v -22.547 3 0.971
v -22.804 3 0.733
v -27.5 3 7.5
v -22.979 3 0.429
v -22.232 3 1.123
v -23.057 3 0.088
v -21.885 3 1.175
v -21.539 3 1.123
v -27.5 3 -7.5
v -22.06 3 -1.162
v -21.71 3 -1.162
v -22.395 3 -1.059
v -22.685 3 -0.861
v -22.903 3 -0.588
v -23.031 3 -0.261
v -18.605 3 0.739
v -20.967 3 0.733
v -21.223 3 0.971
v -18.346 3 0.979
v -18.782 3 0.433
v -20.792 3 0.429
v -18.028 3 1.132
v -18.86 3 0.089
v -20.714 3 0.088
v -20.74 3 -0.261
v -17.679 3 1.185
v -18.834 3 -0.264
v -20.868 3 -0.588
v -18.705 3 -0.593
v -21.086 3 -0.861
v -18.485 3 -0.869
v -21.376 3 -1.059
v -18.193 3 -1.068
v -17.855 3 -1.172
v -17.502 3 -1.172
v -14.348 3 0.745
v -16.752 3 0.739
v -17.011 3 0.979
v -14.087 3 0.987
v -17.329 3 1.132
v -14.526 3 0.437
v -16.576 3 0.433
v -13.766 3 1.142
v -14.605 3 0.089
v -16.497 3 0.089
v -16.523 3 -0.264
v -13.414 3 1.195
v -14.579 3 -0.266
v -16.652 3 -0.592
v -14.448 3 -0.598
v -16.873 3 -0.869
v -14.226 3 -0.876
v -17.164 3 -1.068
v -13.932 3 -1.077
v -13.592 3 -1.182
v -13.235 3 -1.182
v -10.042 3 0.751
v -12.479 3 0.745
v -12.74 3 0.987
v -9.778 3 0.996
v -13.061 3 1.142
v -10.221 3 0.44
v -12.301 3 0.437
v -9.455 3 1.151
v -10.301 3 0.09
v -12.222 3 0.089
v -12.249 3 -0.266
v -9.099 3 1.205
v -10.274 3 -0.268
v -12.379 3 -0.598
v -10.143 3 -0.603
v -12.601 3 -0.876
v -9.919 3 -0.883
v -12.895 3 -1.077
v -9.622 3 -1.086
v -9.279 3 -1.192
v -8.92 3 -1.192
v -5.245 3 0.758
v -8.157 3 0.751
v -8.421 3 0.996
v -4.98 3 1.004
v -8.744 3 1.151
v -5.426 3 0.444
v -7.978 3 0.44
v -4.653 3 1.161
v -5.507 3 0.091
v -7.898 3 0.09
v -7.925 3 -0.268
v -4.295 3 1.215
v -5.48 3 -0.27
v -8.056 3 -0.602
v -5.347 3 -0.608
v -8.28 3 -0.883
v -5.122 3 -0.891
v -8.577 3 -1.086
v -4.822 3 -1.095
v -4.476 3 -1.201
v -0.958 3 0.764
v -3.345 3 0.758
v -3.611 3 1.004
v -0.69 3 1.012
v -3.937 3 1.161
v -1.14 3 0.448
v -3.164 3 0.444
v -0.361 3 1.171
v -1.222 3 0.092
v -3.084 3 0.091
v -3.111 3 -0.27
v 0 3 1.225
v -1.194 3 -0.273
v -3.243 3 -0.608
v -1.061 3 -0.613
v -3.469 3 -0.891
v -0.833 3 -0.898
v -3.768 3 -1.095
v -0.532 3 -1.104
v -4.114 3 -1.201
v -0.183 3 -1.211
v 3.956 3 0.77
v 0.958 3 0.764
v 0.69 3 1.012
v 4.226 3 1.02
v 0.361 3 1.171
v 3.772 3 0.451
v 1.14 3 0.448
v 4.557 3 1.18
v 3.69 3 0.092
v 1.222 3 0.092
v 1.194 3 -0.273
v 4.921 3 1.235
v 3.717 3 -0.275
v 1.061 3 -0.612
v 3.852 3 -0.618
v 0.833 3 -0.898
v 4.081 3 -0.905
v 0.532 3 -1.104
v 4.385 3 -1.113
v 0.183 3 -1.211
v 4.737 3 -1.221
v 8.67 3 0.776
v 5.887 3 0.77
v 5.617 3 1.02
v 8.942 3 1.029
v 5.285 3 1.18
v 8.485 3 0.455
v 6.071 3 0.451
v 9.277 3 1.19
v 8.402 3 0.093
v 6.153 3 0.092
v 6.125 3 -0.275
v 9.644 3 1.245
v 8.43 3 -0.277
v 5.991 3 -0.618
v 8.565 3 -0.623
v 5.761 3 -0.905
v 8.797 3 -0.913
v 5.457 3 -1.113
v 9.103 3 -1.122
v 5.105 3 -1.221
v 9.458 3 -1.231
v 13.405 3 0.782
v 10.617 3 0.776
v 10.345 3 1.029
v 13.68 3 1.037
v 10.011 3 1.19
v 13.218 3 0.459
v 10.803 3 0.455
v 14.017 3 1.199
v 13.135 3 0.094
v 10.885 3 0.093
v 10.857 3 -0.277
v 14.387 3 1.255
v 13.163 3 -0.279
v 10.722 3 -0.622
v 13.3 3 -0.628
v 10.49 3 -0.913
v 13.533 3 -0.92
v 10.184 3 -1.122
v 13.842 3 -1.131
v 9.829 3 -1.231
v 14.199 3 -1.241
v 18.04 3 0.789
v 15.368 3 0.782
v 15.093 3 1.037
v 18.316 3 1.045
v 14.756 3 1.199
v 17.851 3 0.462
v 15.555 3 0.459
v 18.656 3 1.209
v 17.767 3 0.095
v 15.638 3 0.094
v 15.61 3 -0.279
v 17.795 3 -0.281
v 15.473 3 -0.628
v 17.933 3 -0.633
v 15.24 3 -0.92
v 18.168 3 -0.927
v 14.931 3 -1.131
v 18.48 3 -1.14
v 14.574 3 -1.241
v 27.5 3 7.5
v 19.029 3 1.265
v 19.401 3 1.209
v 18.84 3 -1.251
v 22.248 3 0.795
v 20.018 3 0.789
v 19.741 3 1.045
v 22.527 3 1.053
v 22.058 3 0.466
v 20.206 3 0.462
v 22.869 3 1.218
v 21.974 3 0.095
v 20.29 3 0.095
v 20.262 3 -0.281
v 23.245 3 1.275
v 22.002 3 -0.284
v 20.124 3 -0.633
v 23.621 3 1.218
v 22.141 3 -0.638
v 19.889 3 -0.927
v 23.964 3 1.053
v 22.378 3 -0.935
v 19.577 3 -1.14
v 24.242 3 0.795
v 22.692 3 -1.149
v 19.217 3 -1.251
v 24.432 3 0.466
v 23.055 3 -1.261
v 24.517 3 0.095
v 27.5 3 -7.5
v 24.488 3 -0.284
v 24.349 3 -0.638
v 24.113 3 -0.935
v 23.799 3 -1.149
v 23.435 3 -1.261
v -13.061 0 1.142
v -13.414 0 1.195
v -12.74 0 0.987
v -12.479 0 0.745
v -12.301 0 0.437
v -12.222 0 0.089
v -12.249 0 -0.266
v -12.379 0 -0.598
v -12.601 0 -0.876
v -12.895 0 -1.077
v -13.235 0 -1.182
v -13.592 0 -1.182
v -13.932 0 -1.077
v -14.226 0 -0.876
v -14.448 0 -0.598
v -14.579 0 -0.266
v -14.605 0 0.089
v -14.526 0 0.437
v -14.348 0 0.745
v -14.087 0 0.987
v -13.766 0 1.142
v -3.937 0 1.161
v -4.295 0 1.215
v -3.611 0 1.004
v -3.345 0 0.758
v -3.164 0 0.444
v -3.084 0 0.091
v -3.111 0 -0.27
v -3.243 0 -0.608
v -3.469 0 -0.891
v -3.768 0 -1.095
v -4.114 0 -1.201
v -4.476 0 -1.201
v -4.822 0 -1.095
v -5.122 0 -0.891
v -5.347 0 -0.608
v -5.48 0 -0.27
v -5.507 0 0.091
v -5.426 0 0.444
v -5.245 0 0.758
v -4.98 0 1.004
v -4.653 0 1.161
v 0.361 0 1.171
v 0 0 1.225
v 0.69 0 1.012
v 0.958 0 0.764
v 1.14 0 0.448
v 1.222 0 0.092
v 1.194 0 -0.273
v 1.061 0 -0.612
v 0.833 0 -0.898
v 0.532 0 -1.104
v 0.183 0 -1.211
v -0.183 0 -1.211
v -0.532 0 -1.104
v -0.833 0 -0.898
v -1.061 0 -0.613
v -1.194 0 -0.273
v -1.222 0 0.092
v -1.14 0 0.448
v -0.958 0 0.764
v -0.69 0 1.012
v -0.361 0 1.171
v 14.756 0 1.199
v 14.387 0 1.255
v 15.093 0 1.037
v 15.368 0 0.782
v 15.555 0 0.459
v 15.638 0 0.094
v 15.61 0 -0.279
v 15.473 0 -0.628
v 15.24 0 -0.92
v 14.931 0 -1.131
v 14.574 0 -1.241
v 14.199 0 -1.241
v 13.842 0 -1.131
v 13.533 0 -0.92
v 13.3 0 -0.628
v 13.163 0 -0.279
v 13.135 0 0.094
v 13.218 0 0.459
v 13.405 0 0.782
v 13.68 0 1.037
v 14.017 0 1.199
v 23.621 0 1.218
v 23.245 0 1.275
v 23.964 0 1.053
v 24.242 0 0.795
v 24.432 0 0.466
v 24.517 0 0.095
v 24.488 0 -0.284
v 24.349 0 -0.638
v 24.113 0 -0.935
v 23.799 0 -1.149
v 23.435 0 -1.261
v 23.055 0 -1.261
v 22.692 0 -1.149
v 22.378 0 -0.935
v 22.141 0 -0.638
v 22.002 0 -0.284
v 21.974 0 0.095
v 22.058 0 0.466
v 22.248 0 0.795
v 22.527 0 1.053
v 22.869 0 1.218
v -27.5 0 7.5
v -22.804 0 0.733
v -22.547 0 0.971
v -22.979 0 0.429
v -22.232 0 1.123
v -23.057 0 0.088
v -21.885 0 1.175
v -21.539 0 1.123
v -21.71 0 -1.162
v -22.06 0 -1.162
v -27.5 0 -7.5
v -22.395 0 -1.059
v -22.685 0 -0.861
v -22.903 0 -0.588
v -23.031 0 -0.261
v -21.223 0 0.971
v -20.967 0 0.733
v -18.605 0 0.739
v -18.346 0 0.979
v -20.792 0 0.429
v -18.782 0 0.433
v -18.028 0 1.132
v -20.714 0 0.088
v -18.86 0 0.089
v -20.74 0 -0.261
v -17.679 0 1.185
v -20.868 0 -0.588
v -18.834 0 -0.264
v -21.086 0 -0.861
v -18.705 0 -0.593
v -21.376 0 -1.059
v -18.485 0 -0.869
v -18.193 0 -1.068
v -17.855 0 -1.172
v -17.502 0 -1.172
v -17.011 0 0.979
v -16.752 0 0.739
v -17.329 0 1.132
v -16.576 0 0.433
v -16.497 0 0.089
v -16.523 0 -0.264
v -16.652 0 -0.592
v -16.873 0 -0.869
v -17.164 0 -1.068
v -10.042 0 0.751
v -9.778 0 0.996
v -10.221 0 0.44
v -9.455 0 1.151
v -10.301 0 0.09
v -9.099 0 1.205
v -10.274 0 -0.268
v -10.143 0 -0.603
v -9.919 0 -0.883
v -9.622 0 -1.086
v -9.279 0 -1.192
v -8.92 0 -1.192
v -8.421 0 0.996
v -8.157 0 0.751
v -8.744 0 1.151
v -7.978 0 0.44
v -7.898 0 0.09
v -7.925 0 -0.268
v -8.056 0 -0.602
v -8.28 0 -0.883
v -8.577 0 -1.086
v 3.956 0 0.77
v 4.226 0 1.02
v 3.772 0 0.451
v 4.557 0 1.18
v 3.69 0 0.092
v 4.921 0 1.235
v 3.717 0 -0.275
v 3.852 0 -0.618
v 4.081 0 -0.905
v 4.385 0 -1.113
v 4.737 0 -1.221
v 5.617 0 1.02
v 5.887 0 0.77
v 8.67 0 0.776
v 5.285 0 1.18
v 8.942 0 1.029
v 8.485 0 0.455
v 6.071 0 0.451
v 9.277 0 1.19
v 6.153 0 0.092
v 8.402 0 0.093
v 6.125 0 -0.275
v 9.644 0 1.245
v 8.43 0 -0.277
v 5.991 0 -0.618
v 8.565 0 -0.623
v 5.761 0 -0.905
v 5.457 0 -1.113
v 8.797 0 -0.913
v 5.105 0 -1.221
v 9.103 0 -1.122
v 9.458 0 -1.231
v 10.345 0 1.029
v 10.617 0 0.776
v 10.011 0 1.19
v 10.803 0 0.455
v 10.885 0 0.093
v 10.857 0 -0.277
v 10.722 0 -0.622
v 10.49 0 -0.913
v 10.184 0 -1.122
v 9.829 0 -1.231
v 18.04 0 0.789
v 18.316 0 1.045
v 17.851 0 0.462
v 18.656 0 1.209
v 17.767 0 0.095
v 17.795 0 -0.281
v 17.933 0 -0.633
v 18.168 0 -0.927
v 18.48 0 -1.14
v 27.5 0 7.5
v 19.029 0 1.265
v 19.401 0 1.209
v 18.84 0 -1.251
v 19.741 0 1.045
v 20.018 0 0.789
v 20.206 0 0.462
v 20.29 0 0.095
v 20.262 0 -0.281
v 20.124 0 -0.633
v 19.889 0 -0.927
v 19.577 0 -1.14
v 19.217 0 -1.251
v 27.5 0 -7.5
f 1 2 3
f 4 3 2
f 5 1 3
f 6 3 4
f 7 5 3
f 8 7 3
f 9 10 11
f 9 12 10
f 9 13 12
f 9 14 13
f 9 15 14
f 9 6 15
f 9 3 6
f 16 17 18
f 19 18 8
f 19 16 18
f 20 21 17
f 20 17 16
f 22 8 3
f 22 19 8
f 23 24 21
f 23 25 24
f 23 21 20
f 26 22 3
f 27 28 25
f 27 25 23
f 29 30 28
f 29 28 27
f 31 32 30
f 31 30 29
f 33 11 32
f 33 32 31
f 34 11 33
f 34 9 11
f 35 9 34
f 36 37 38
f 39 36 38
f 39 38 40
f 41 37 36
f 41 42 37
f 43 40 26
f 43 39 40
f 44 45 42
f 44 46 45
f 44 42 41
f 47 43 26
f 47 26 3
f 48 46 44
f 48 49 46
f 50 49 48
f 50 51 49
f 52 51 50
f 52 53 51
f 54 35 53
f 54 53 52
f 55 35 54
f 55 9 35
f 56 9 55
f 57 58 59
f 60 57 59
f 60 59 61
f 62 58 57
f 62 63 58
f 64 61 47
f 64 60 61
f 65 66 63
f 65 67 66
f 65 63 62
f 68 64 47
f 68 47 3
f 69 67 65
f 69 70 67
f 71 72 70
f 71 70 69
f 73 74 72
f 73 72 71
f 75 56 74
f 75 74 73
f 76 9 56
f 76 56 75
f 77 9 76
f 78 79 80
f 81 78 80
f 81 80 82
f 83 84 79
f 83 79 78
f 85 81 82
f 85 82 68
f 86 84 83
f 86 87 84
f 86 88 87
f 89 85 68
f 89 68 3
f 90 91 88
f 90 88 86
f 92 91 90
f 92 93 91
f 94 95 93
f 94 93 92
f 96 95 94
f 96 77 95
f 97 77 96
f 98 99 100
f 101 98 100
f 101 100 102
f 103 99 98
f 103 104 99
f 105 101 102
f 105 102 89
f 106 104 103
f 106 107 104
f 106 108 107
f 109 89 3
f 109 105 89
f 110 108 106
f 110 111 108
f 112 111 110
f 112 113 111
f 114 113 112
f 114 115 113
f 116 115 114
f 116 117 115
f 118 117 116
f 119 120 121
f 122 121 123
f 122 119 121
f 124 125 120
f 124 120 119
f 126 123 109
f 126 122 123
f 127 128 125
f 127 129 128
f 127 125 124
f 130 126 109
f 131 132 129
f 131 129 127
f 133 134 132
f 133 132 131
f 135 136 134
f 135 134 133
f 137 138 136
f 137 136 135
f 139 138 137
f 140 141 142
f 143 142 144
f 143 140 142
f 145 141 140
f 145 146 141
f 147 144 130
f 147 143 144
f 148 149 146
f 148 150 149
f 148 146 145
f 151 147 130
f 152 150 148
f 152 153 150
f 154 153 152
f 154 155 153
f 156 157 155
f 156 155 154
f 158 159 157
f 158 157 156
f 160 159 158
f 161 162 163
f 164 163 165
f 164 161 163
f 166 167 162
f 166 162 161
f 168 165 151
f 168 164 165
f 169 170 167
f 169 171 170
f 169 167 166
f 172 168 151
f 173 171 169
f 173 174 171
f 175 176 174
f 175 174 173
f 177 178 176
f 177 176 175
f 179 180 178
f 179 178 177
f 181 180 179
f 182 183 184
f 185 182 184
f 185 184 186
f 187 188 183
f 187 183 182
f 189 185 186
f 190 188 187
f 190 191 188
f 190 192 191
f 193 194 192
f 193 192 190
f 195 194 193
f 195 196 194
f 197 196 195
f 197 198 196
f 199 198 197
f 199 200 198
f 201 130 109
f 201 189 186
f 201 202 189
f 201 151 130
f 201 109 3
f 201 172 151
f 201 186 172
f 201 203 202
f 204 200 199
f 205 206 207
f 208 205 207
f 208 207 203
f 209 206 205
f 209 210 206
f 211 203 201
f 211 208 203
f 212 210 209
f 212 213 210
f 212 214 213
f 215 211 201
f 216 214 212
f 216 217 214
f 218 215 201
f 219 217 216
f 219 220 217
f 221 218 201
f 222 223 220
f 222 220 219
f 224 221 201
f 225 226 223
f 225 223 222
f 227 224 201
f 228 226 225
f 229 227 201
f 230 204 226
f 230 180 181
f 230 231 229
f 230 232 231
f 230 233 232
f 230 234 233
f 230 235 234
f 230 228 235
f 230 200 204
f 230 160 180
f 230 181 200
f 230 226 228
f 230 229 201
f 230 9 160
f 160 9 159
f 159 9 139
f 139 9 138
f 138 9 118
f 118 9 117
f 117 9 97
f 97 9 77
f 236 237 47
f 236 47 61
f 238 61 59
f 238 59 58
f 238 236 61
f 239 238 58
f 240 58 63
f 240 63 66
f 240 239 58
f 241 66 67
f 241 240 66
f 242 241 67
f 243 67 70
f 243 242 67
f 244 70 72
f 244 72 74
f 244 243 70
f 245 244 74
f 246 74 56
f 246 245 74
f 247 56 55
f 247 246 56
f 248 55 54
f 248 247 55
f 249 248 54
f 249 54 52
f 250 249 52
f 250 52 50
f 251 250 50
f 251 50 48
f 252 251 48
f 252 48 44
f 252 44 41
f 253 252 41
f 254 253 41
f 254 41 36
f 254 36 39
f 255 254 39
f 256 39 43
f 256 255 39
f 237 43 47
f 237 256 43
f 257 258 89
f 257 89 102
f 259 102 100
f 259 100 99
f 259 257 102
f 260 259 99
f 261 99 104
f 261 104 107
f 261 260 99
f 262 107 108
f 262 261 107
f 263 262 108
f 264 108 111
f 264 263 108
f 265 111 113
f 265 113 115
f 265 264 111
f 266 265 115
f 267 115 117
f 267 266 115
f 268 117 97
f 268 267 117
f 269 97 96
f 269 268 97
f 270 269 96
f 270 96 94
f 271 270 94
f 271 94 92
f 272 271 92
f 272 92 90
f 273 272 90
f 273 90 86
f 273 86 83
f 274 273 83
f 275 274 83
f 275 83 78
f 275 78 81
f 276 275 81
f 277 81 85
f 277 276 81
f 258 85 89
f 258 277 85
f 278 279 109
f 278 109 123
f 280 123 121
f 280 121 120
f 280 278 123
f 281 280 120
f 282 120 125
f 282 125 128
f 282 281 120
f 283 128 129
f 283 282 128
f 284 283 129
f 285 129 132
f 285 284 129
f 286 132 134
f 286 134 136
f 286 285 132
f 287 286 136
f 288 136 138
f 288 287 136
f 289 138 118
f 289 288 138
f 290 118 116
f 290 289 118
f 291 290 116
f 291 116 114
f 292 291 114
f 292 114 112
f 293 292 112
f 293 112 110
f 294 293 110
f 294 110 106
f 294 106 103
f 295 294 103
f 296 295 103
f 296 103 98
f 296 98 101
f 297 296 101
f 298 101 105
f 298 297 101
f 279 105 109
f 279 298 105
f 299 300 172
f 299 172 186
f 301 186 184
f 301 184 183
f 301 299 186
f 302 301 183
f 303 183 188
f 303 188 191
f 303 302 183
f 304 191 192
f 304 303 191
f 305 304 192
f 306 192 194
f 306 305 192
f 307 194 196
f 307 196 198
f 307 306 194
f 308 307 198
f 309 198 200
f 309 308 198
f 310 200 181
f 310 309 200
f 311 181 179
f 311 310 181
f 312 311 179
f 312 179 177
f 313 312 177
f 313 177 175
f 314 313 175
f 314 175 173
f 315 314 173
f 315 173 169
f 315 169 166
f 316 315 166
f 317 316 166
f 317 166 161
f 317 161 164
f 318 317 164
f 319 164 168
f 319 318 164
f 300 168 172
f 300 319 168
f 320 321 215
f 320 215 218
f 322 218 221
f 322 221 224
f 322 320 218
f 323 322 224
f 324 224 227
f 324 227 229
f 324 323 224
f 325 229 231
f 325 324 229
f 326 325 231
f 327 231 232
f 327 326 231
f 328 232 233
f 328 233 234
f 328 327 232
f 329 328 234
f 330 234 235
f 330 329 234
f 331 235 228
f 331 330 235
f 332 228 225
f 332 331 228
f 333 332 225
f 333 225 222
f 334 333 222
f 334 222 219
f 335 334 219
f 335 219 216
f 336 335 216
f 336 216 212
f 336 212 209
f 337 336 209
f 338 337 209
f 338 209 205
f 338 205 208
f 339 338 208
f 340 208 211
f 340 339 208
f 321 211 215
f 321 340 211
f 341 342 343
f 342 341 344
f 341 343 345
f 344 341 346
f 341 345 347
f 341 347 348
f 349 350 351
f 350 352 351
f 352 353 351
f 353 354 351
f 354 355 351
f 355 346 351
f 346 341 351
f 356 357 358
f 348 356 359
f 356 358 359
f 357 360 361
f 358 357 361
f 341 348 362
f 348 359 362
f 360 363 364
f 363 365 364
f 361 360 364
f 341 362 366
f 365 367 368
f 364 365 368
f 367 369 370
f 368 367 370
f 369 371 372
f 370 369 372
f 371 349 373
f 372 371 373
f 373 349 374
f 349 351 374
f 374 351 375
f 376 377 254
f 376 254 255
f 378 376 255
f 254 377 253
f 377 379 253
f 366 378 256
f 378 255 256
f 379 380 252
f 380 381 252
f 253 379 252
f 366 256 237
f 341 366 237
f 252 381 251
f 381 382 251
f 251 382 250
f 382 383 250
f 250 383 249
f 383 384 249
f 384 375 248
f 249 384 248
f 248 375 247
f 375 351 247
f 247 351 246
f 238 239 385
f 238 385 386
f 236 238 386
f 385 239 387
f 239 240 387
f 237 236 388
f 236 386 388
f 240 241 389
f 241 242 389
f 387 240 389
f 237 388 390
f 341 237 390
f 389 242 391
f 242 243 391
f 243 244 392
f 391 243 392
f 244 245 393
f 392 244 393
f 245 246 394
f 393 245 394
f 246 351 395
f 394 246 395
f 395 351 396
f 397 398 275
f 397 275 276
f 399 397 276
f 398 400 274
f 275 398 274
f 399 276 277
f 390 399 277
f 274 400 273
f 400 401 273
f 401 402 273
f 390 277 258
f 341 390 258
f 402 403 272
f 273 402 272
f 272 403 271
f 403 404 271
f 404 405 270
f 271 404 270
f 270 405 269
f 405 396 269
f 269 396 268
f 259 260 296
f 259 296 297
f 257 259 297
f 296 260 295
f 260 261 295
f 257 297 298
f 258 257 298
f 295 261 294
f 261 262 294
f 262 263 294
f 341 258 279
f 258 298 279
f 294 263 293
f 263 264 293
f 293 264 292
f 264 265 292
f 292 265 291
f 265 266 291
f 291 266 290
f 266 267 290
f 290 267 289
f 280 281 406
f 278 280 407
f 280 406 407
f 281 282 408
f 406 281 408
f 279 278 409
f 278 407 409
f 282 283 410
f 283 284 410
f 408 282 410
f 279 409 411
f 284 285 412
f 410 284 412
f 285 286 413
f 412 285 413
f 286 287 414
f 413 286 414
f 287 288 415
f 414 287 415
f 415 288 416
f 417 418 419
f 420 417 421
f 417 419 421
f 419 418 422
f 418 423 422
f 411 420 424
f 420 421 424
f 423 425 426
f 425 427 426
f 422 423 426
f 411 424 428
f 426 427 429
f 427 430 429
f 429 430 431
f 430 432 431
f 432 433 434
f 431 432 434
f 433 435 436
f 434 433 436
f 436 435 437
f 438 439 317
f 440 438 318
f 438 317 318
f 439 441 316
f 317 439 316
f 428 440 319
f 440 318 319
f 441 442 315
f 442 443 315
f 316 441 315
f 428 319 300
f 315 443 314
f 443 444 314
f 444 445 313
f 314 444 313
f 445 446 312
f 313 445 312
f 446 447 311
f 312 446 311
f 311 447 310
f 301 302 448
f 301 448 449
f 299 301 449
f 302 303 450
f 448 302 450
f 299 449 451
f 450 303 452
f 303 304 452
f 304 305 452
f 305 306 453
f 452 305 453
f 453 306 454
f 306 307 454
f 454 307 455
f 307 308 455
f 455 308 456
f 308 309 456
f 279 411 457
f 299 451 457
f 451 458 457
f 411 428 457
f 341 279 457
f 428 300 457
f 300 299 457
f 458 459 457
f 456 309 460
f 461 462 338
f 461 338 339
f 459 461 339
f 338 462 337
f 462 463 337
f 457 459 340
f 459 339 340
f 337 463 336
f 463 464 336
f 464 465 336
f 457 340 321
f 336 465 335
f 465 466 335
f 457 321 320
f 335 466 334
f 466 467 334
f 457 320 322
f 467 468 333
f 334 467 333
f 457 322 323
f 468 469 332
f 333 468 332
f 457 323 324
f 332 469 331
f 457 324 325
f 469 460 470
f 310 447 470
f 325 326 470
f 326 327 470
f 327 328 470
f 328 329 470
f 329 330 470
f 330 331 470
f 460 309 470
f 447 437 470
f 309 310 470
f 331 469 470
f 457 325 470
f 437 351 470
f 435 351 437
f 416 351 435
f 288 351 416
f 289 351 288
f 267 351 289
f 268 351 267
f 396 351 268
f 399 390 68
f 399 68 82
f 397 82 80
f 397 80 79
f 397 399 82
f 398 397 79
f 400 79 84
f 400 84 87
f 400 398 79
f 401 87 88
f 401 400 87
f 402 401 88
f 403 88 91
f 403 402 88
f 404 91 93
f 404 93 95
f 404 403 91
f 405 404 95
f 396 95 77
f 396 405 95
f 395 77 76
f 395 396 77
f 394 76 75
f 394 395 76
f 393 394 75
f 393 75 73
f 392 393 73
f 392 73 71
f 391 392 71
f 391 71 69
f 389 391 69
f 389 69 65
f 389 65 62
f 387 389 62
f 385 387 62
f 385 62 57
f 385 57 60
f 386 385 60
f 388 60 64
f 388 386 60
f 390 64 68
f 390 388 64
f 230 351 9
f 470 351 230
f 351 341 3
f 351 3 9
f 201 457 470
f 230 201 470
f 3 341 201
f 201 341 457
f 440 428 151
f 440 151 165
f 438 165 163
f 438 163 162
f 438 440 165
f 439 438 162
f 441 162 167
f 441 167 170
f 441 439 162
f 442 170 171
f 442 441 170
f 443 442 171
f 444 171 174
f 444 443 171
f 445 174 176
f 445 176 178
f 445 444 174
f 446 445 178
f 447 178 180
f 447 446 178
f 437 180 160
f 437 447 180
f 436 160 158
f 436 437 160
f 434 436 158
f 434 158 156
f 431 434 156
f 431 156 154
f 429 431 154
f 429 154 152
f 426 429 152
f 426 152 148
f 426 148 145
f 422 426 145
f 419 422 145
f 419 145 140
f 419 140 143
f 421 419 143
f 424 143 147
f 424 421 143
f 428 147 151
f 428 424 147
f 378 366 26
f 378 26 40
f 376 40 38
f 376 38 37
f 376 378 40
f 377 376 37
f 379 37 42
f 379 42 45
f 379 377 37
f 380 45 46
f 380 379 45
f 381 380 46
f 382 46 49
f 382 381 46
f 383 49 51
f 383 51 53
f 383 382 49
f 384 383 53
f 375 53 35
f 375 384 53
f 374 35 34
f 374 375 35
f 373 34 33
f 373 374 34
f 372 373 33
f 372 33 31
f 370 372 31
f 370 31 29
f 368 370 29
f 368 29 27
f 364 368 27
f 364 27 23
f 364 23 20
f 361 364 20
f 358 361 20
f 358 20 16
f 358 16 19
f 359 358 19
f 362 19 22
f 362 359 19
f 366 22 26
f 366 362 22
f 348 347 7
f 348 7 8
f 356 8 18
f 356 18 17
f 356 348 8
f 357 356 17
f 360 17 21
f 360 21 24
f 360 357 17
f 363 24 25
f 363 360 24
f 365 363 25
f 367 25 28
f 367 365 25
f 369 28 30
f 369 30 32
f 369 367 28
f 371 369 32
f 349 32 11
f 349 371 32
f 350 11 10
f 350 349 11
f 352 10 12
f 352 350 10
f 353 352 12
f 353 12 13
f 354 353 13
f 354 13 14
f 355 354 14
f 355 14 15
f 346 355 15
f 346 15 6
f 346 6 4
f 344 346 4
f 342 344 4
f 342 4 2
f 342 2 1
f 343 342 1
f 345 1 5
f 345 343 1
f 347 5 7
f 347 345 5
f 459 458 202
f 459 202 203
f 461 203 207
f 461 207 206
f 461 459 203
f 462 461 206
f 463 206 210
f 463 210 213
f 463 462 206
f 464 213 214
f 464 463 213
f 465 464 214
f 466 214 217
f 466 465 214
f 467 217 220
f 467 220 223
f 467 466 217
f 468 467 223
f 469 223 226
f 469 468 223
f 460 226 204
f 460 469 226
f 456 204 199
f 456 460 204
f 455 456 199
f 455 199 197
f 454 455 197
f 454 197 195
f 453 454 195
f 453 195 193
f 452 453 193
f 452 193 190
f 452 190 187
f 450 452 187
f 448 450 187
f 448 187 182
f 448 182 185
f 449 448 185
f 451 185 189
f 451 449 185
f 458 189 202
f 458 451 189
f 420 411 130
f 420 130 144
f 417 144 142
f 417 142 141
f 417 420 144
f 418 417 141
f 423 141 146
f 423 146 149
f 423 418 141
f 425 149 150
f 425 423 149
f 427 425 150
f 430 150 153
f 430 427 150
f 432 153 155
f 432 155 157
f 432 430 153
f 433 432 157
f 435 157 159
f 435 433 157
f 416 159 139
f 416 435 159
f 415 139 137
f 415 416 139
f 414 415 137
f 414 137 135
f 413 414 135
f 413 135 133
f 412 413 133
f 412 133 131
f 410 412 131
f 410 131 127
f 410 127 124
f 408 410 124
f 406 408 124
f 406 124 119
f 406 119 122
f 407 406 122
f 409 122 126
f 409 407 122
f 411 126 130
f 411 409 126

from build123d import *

# Parameters (mm, degrees)
CROQUIS1_W              = 55
CROQUIS1_H              = 15
CROQUIS1_R              = 1.175
CROQUIS1_R_2            = 1.185
CROQUIS1_R_3            = 1.195
CROQUIS1_R_4            = 1.205
CROQUIS1_R_5            = 1.215
CROQUIS1_R_6            = 1.225
CROQUIS1_R_7            = 1.235
CROQUIS1_R_8            = 1.245
CROQUIS1_R_9            = 1.255
CROQUIS1_R_10           = 1.265
CROQUIS1_R_11           = 1.275
SALIENTE_EXTRUIR1_DEPTH = 3


with BuildPart() as part:
    # Croquis1 → Saliente-Extruir1 (new body)
    with BuildSketch(Plane(origin=(0, 0, 0), x_dir=(1, 0, 0), z_dir=(0, 1, 0))):
        Rectangle(CROQUIS1_W, CROQUIS1_H)
        with Locations(Location((-21.88537105, 0, 0), (0, 0, 270))):
            Circle(CROQUIS1_R, mode=Mode.SUBTRACT)
        with Locations(Location((-17.678607244, 0, 0), (0, 0, 270))):
            Circle(CROQUIS1_R_2, mode=Mode.SUBTRACT)
        with Locations(Location((-13.4135496, 0, 0), (0, 0, 270))):
            Circle(CROQUIS1_R_3, mode=Mode.SUBTRACT)
        with Locations(Location((-9.099468305, 0, 0), (0, 0, 270))):
            Circle(CROQUIS1_R_4, mode=Mode.SUBTRACT)
        with Locations(Location((-4.295150499, 0, 0), (0, 0, 270))):
            Circle(CROQUIS1_R_5, mode=Mode.SUBTRACT)
        with Locations(Location((0, 0, 0), (0, 0, 270))):
            Circle(CROQUIS1_R_6, mode=Mode.SUBTRACT)
        with Locations(Location((4.921295904, 0, 0), (0, 0, 270))):
            Circle(CROQUIS1_R_7, mode=Mode.SUBTRACT)
        with Locations(Location((9.643654095, 0, 0), (0, 0, 270))):
            Circle(CROQUIS1_R_8, mode=Mode.SUBTRACT)
        with Locations(Location((14.38652568, 0, 0), (0, 0, 270))):
            Circle(CROQUIS1_R_9, mode=Mode.SUBTRACT)
        with Locations(Location((19.028560127, 0, 0), (0, 0, 270))):
            Circle(CROQUIS1_R_10, mode=Mode.SUBTRACT)
        with Locations(Location((23.245310452, 0, 0), (0, 0, 270))):
            Circle(CROQUIS1_R_11, mode=Mode.SUBTRACT)
    extrude(amount=SALIENTE_EXTRUIR1_DEPTH)


solid = part.part
